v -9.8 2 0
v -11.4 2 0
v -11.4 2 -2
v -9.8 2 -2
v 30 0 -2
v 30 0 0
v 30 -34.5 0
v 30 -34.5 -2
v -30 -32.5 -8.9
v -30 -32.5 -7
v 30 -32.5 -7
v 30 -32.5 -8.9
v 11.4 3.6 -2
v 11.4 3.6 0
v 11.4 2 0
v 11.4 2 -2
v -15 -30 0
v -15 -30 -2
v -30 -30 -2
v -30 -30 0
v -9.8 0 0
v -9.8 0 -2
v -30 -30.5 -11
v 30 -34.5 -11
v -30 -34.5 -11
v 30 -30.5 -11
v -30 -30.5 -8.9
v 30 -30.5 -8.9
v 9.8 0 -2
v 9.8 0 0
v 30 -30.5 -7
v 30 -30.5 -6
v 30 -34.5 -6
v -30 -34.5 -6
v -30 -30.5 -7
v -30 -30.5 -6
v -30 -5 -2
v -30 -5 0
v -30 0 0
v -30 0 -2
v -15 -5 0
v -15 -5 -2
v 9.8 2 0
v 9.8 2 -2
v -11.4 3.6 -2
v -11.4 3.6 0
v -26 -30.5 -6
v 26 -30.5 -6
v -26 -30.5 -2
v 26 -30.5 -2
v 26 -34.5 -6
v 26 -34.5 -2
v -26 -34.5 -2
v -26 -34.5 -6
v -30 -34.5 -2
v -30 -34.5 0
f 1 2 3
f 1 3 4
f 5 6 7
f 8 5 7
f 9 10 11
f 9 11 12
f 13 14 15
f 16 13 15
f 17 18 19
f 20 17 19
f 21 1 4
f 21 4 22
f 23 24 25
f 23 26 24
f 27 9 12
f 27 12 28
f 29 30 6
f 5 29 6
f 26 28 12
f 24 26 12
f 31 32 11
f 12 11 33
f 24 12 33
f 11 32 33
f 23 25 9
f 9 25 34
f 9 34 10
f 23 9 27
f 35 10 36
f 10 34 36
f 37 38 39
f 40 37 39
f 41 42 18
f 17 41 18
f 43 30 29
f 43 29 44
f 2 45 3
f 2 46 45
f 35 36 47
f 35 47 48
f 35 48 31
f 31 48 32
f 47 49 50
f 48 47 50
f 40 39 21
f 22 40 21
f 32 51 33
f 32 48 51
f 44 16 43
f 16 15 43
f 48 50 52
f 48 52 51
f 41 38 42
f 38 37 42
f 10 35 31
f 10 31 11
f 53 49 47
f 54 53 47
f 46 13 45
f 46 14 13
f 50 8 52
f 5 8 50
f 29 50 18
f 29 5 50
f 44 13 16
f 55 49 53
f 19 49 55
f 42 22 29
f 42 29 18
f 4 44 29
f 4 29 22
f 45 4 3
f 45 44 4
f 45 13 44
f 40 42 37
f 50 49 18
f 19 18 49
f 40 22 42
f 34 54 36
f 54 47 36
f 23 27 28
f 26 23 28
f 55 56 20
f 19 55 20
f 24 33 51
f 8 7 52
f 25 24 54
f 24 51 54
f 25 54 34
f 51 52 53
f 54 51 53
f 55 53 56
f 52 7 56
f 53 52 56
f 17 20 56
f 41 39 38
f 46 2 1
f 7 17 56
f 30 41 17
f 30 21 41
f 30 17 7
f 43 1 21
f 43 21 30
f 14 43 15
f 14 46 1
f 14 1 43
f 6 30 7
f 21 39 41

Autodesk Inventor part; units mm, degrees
ref_plane "YZ Plane" through (0, 0, 0) normal (1, 0, 0) x (0, 1, 0)
ref_plane "XZ Plane" through (0, 0, 0) normal (0, 1, 0) x (-1, 0, 0)
ref_plane "XY Plane" through (0, 0, 0) normal (0, 0, 1) x (1, 0, 0)
sketch "Skizze1" plane through (0, 0, 0) normal (0, 0, 1) x (1, 0, 0)
  line L0 (-30, 0) -> (30, 0)
  line L1 (30, 0) -> (30, -34.5)
  line L2 (30, -34.5) -> (-30, -34.5)
  line L3 (-30, -34.5) -> (-30, 0)
  line L4 (-9.8, 0) -> (9.8, 0)
  line L5 (9.8, 0) -> (9.8, 3.6)
  line L6 (9.8, 3.6) -> (-9.8, 3.6)
  line L7 (-9.8, 3.6) -> (-9.8, 0)
  line L8 (9.8, 3.6) -> (11.4, 3.6)
  line L9 (11.4, 3.6) -> (11.4, 2)
  line L10 (11.4, 2) -> (9.8, 2)
  line L11 (9.8, 2) -> (9.8, 3.6)
  line L12 (-9.8, 3.6) -> (-11.4, 3.6)
  line L13 (-11.4, 3.6) -> (-11.4, 2)
  line L14 (-11.4, 2) -> (-9.8, 2)
  line L15 (-9.8, 2) -> (-9.8, 3.6)
  point P0 (0, 0)
  point P1 (0, 0)
  point P2 (9.8, 1.8)
  dimension "d0" = 3.6
  dimension "d1" = 19.6
  dimension "d2" = 1.6
  dimension "d3" = 1.6
  dimension "d4" = 1.6
  dimension "d5" = 1.6
  dimension "d6" = 34.5
  dimension "d7" = 60
  dimension "d8" = 30
  dimension "d9" = 9.8
extrude "Extrusion1" add sketch "Skizze1" against normal blind 2
sketch "Skizze2" plane through (0, 0, -2) normal (0, 0, -1) x (-1, 0, 0)
  line L0 (-30, -34.5) -> (30, -34.5) projected
  line L1 (30, -34.5) -> (30, 0) projected
  line L2 (-30, -34.5) -> (30, -34.5)
  line L3 (30, -34.5) -> (30, -30.5)
  line L4 (30, -30.5) -> (-30, -30.5)
  line L5 (-30, -30.5) -> (-30, -34.5)
  point P0 (0, 0)
  dimension "d12" = 4
extrude "Extrusion2" add sketch "Skizze2" along normal blind 9
sketch "Skizze3" plane through (-30, -34.5, 0) normal (-1, 0, 0) x (0, 0, 1)
  line L0 (-2, 4) -> (-11, 4) projected
  line L1 (-8.9, 4) -> (-7, 4)
  line L2 (-7, 4) -> (-7, 2)
  line L3 (-7, 2) -> (-8.9, 2)
  line L4 (-8.9, 2) -> (-8.9, 4)
  line L5 (-2, 4) -> (-2, 34.5) projected
  point P0 (0, 34.5)
  dimension "d15" = 1.9
  dimension "d16" = 2
  dimension "d17" = 5
extrude "Extrusion3" cut sketch "Skizze3" against normal through all
sketch "Skizze4" plane through (-30, -30.5, -2) normal (0, 1, 0) x (1, 0, 0)
  line L0 (60, 0) -> (0, 0) projected
  line L1 (0, 0) -> (4, 0)
  line L2 (4, 0) -> (4, 4)
  line L3 (4, 4) -> (0, 4)
  line L4 (0, 4) -> (0, 0)
  line L5 (60, -2) -> (60, 9) projected
  line L6 (60, 0) -> (56, 0)
  line L7 (56, 0) -> (56, 4)
  line L8 (56, 4) -> (60, 4)
  line L9 (60, 4) -> (60, 0)
  point P0 (30, -2)
  point P1 (60, 4)
  point P2 (4, 0)
  dimension "d20" = 4
  dimension "d21" = 4
  dimension "d22" = 4
  dimension "d23" = 4
extrude "Extrusion4" cut sketch "Skizze4" against normal blind 10
sketch "Skizze5" plane through (0, 0, -2) normal (0, 0, -1) x (-1, 0, 0)
  line L0 (30, 0) -> (30, -34.5) projected
  line L1 (30, -5) -> (15, -5)
  line L2 (15, -5) -> (15, -30)
  line L3 (15, -30) -> (30, -30)
  line L4 (30, -30) -> (30, -5)
  line L5 (30, 0) -> (9.8, 0) projected
  point P0 (0, 0)
  point P1 (30, -30.5)
  dimension "d28" = 15
  dimension "d29" = 25
  dimension "d30" = 5
extrude "Extrusion5" cut sketch "Skizze5" against normal blind 10
equation "\"d2\" = d4"
equation "\"d3\" = d4"
equation "\"d5\" = d4"
equation "\"d8\" = 0.5 * d7"
equation "\"d9\" = 0.5 * d1"
properties part number "ClipUnten"
